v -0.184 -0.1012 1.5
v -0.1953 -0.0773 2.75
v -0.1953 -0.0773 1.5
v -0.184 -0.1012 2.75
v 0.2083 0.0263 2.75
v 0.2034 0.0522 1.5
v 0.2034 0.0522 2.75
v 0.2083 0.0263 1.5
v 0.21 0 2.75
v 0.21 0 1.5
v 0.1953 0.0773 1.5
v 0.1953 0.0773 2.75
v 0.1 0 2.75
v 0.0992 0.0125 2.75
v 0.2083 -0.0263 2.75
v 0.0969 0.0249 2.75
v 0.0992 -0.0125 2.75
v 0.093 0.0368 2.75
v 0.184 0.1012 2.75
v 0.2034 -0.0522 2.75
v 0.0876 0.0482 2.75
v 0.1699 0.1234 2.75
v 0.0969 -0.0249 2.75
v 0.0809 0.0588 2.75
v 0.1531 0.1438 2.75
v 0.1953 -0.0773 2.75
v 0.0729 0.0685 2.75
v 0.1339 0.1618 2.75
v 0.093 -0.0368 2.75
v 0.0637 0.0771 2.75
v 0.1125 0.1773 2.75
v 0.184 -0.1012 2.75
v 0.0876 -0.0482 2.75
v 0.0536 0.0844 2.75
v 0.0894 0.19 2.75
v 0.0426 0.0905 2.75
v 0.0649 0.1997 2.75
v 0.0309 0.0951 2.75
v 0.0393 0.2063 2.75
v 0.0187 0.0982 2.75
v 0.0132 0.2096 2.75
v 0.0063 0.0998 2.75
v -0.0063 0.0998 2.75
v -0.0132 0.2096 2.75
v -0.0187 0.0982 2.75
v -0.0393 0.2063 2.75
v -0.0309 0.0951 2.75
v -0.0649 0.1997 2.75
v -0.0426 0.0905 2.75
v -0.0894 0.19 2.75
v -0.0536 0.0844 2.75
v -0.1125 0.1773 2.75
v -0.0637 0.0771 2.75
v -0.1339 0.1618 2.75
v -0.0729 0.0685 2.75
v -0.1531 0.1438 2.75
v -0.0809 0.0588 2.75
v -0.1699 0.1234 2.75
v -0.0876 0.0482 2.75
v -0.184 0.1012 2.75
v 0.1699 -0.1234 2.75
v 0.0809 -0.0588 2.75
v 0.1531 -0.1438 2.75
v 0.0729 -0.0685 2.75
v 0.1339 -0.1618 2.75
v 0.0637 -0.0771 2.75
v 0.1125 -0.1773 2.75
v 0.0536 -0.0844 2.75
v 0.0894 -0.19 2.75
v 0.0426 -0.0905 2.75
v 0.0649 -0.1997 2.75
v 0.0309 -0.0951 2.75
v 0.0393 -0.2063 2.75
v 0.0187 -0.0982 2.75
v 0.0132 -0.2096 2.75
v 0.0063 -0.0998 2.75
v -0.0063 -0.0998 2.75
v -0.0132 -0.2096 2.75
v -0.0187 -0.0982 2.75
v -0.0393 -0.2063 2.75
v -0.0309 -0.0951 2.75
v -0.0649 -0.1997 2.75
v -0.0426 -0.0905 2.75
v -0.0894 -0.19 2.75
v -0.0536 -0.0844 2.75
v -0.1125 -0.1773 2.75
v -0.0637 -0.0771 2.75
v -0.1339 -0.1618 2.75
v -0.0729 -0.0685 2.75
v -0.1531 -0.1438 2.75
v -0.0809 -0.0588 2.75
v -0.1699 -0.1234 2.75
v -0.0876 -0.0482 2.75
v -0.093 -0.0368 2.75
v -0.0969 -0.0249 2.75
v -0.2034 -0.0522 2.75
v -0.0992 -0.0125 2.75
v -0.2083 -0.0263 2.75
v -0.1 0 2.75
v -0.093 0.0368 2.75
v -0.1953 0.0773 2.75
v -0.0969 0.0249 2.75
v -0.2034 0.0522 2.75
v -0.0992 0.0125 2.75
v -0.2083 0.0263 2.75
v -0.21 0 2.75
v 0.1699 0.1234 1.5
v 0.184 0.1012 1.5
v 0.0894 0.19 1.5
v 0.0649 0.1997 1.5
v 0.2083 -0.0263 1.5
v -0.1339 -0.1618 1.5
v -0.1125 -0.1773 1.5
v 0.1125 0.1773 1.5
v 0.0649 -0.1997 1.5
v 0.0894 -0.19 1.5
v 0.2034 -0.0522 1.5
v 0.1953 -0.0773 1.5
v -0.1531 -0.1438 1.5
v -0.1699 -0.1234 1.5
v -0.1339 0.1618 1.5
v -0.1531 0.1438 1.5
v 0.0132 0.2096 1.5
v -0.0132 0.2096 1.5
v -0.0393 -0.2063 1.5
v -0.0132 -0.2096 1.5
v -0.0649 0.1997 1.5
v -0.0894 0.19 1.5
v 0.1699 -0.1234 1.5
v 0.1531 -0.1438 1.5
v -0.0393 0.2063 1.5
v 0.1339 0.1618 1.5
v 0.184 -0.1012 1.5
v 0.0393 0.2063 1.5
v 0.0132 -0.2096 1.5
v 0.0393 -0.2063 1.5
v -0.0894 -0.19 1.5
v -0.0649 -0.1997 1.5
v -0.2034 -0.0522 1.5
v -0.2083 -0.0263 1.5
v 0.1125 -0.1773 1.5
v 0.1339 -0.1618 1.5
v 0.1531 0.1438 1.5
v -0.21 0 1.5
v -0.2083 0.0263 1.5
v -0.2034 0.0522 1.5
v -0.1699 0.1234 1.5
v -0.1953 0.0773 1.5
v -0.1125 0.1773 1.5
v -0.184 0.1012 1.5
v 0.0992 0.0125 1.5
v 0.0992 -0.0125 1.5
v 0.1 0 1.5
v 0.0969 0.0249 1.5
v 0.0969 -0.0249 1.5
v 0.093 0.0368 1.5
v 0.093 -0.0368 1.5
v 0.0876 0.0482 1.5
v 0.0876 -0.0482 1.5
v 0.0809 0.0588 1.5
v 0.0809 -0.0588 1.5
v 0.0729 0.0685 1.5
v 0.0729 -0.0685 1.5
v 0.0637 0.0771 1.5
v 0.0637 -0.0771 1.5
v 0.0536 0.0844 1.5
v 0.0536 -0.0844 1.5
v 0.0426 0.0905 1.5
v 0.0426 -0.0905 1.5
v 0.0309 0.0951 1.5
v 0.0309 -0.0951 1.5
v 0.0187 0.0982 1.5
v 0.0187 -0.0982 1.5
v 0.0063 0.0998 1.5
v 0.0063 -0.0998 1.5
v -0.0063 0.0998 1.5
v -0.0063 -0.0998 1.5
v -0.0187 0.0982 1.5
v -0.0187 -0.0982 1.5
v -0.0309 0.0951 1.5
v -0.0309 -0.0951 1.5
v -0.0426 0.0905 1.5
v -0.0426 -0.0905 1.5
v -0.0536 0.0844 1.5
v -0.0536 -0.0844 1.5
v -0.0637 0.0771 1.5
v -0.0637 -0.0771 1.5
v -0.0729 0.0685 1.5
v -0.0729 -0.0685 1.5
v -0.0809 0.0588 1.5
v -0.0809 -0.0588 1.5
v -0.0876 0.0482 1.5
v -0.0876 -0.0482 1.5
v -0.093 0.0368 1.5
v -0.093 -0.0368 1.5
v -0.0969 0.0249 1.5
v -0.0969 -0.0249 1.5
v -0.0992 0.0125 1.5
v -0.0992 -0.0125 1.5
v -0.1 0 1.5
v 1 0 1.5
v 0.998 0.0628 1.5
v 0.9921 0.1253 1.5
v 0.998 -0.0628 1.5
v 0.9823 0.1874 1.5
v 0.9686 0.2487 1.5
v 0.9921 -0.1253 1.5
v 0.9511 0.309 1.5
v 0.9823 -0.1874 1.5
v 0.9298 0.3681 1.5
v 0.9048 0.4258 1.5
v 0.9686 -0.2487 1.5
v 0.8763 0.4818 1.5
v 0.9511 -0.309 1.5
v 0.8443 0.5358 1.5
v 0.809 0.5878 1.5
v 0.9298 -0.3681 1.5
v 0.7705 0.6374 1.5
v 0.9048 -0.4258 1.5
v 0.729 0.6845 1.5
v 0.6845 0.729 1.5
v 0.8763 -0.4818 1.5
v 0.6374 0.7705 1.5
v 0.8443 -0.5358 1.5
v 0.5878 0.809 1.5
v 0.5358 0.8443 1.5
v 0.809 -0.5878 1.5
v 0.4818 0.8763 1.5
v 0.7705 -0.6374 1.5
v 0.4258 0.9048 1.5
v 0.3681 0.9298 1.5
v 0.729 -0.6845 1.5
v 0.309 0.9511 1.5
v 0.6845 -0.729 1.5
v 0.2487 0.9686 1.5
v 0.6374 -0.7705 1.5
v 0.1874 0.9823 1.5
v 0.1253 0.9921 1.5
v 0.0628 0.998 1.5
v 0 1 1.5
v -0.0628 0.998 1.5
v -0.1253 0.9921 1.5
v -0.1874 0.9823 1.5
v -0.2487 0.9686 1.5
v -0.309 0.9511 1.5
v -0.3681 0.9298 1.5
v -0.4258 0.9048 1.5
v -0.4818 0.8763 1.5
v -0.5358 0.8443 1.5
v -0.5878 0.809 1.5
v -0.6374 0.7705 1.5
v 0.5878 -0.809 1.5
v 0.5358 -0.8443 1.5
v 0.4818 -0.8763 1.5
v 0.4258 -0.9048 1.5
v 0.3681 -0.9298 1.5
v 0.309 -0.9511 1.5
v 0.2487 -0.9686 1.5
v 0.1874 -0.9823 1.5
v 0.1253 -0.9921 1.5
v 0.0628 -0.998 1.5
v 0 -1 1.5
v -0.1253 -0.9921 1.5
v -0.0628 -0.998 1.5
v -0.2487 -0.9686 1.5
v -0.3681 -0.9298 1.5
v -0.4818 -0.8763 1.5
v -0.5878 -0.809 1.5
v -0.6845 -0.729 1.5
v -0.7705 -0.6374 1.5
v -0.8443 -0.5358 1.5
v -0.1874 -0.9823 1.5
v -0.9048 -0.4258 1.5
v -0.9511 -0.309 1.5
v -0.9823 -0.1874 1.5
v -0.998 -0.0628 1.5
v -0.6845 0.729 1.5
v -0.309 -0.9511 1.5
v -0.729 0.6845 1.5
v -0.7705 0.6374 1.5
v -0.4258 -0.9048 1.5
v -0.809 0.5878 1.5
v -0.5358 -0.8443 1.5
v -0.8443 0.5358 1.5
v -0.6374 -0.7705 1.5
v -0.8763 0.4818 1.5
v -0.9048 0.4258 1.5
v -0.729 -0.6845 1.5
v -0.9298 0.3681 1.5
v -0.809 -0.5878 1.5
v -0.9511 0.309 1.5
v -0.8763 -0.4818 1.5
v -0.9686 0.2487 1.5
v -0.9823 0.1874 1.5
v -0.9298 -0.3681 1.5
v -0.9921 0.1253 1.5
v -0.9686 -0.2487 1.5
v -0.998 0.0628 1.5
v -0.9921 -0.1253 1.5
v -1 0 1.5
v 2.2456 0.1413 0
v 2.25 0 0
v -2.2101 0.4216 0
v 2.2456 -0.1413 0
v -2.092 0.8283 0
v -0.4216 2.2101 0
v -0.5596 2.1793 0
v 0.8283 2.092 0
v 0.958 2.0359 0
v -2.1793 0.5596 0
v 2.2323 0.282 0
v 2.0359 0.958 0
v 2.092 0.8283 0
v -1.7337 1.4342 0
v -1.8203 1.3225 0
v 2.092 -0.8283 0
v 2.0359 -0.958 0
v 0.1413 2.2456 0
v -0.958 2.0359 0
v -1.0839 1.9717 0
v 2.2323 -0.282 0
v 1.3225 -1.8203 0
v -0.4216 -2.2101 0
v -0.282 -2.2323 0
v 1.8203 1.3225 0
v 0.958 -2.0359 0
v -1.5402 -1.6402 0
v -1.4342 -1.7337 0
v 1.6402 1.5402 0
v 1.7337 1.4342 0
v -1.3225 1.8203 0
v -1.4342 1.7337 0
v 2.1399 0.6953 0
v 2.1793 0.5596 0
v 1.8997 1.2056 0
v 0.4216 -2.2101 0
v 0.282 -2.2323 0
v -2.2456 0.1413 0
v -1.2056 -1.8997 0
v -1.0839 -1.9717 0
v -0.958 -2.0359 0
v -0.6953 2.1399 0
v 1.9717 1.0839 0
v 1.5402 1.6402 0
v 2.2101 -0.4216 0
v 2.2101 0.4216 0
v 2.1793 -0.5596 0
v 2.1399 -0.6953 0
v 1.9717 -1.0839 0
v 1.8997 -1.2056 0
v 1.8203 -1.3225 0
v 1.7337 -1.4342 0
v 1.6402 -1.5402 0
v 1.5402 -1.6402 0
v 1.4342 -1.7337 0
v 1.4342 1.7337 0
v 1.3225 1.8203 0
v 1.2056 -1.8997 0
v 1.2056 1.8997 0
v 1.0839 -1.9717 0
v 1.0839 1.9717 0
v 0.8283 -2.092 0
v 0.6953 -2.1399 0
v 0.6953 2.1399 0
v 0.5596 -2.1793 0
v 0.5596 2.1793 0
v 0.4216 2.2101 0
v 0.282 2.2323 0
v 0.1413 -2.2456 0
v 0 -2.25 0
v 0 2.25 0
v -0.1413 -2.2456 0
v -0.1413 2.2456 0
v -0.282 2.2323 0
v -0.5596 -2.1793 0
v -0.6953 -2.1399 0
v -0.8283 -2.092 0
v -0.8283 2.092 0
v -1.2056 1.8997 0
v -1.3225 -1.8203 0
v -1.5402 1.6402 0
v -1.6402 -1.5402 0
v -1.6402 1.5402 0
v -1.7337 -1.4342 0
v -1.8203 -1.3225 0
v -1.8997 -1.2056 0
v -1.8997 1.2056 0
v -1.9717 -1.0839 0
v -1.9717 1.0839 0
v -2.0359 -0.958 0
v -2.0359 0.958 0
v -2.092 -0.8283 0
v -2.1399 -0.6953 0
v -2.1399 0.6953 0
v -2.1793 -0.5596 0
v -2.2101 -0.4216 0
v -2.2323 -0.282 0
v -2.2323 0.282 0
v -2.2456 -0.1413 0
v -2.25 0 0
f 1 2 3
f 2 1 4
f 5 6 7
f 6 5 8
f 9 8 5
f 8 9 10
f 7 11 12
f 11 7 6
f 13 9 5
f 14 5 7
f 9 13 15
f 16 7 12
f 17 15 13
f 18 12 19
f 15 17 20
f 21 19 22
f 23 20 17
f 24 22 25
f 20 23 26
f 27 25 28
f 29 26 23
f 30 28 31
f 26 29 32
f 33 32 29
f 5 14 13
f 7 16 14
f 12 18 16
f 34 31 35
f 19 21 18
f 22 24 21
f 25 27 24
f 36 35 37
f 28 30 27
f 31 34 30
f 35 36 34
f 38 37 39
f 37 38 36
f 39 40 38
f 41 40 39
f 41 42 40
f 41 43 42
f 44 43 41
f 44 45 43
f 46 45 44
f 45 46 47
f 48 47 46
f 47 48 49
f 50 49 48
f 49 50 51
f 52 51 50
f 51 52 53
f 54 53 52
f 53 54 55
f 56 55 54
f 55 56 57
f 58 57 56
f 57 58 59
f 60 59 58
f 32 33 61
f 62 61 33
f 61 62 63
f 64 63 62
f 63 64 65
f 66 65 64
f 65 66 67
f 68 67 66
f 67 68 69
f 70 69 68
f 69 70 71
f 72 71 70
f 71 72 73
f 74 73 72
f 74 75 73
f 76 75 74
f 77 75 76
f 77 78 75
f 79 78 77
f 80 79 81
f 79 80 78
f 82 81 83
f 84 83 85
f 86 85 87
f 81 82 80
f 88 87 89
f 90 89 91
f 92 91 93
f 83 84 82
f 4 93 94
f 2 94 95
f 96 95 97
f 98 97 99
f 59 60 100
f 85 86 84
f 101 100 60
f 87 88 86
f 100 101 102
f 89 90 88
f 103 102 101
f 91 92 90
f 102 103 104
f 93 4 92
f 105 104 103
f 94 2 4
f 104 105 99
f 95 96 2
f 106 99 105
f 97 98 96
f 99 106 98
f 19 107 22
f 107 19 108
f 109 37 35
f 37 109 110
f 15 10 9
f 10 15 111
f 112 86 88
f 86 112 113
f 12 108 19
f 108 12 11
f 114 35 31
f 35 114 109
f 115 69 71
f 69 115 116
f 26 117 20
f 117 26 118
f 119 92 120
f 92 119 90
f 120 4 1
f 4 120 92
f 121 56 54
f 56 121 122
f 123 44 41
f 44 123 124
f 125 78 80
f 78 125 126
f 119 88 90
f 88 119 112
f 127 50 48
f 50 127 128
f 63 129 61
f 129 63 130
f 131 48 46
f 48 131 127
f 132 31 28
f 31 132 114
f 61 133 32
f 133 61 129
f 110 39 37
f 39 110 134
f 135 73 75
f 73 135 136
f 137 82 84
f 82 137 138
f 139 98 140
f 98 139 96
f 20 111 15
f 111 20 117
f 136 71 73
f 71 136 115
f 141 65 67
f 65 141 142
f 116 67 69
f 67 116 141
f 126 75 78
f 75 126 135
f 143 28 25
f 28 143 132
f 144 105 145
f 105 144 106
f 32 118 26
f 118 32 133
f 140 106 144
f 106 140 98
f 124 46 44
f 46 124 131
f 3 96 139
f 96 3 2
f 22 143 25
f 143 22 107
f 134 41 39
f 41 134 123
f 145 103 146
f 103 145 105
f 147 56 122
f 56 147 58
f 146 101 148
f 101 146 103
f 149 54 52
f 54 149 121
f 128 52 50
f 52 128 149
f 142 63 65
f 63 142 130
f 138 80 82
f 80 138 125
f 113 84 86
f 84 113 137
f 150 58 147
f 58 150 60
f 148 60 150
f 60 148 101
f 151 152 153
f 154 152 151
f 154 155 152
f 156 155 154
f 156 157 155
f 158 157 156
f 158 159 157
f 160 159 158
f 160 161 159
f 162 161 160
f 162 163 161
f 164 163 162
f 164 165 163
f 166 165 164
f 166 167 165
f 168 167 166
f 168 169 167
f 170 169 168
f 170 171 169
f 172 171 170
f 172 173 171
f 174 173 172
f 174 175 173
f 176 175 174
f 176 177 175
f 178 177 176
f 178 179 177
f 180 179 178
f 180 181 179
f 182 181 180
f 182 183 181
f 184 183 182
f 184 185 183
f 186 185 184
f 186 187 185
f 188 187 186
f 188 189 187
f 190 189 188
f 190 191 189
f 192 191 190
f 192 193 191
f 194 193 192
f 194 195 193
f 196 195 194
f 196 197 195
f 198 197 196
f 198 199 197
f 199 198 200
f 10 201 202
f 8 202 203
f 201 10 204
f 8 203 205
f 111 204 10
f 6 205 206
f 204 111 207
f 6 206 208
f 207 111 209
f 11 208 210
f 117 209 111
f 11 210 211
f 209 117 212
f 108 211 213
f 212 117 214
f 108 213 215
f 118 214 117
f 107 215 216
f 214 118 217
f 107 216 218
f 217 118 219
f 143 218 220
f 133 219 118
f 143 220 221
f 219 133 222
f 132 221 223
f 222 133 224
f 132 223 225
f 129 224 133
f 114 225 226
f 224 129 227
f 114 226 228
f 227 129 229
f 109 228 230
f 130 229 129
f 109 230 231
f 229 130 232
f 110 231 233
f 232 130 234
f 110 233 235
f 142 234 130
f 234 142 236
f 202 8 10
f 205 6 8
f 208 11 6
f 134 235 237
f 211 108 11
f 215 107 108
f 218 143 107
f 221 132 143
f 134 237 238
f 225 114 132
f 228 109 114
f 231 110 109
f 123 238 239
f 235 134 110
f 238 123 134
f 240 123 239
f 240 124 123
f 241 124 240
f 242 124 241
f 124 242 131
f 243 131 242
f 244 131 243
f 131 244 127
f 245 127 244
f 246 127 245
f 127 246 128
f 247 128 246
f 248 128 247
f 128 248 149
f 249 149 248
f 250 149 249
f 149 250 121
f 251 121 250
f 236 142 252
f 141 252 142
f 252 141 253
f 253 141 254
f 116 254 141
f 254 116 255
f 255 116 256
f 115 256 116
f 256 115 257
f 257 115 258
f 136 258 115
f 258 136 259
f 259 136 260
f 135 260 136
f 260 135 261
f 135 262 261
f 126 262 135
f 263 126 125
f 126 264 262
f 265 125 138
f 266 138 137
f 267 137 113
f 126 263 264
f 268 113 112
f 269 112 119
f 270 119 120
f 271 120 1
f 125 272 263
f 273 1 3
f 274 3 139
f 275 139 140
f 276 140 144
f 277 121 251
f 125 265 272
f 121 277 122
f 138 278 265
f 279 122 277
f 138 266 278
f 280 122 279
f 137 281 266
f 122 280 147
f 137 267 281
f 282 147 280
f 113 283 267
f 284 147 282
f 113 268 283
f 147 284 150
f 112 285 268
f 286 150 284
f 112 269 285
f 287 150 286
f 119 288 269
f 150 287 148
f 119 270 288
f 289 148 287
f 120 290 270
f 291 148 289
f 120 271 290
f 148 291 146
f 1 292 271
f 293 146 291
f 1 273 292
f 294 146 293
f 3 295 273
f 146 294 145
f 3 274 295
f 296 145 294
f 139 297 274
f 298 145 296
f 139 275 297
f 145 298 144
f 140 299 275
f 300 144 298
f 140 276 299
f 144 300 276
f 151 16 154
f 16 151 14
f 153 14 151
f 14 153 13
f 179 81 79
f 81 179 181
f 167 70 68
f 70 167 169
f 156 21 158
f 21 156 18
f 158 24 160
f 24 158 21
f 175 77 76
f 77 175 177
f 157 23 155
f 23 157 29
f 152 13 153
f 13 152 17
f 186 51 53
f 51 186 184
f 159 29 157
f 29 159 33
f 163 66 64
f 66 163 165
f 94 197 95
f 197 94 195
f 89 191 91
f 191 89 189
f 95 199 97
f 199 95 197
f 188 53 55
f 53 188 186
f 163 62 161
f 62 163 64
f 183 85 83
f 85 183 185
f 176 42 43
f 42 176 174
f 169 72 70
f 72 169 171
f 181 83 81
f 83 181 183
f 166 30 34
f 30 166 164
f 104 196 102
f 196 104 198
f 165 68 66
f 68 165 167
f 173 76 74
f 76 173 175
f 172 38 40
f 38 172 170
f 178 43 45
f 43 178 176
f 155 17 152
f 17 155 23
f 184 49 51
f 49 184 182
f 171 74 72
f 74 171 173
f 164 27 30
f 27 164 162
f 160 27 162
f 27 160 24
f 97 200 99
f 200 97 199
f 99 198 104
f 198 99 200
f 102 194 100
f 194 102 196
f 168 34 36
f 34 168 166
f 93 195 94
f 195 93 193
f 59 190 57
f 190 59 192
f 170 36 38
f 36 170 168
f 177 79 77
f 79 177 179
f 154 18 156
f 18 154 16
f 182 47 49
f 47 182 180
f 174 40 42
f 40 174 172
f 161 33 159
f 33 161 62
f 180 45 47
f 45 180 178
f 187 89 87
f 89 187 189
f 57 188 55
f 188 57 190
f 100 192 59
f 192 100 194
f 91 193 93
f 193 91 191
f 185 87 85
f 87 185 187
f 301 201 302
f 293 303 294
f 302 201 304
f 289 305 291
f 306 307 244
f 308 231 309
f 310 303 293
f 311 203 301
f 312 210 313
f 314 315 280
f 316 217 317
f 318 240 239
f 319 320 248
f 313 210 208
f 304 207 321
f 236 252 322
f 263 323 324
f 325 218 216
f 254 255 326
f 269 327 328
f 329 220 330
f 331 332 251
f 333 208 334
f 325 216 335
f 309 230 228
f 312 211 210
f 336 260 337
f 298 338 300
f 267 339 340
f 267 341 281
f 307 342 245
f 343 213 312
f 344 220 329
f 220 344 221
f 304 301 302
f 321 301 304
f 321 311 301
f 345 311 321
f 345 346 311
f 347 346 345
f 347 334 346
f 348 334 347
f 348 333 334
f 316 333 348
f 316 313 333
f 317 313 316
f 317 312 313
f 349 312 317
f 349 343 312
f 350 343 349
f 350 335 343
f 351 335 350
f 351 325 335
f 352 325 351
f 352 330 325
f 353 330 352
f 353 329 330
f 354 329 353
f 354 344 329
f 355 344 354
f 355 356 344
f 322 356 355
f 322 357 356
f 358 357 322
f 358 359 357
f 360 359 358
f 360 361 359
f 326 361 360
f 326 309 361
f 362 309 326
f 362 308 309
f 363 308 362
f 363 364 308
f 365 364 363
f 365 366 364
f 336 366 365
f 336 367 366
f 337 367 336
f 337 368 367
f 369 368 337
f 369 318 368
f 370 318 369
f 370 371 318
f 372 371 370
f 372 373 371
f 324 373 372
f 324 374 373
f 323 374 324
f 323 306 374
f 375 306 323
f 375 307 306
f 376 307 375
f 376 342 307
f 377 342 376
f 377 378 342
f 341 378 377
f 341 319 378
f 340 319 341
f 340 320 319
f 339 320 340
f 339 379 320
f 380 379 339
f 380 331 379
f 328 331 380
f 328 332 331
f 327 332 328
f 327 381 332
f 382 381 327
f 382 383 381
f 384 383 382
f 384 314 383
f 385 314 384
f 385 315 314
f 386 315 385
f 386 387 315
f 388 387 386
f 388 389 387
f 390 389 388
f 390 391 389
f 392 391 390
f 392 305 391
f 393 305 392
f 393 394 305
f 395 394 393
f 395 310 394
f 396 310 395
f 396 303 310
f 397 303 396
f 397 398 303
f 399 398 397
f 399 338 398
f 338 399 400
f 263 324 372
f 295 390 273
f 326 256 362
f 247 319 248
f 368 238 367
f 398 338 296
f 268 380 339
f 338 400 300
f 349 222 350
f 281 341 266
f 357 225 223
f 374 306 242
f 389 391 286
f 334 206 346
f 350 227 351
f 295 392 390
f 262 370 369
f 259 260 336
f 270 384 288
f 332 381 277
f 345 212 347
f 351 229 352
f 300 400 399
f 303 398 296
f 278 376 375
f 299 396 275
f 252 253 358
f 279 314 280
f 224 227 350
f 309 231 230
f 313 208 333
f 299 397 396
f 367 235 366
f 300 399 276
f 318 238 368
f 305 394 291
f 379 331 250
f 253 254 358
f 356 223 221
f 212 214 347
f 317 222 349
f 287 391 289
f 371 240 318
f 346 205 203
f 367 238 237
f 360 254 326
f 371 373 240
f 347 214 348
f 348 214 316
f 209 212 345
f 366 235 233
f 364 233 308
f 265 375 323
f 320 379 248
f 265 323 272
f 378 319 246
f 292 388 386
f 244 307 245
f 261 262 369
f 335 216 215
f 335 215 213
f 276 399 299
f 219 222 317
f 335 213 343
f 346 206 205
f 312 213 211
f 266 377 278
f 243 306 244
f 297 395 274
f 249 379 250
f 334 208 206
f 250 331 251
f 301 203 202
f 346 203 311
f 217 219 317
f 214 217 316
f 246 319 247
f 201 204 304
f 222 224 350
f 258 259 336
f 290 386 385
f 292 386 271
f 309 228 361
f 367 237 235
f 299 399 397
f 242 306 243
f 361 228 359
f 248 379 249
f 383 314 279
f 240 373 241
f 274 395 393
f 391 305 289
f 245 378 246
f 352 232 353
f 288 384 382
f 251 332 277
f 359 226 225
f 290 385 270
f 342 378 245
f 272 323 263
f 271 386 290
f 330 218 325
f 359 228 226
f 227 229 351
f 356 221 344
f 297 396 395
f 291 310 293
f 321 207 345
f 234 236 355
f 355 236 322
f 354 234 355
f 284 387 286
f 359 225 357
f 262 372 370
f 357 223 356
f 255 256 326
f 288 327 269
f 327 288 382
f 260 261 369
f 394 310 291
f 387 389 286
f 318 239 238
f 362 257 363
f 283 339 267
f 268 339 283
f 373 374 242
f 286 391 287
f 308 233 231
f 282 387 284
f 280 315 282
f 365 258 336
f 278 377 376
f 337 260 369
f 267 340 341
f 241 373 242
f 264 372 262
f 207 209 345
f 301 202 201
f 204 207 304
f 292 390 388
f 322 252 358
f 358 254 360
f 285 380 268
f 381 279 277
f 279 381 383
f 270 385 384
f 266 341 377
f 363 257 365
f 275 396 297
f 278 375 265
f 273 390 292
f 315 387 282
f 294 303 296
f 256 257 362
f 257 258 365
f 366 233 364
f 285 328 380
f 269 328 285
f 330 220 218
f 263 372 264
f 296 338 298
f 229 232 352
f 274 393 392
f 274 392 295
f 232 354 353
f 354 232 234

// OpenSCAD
// Width of the tree base
numerical_slider = .05; // [.1:.85]
cylinder(h=1.5,r1=2.25,r2=1,$fn=100);
translate ([0,0,1.5]) {
    difference () {
        cylinder(h=1.25,r1=numerical_slider+.16,r2=numerical_slider+.16,$fn=50);
        cylinder(h=1.25,r1=numerical_slider+.05,r2=numerical_slider+.05,$fn=50);
    }
}
